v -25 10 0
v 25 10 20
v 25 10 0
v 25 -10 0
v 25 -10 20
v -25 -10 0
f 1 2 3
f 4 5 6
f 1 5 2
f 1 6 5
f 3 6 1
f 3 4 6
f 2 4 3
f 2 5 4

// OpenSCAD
// -*- mode: SCAD ; c-file-style: "ellemtel" ; coding: utf-8 -*-
//
// Simple wedge generator
//
// Written by Roland Sieker <ospalh@gmail.com>, 2017
// Licence: CC-0
// Have fun.

//
length = 50; // [1:0.1:200]
width = 20; // [1:0.1:200]
hight = 20; // [1:0.1:200]
// The hight of the sharp end. Typically 0
hight_2 = 0; // [0:0.1:190]



module wedge()
{
   translate([0,width/2,0])
   rotate([90,0,0])
   {
      linear_extrude(width)
      {
         polygon([[-length/2,0], [length/2,0], [length/2,hight], [-length/2,hight_2]]);

      }
   }
}

wedge();
